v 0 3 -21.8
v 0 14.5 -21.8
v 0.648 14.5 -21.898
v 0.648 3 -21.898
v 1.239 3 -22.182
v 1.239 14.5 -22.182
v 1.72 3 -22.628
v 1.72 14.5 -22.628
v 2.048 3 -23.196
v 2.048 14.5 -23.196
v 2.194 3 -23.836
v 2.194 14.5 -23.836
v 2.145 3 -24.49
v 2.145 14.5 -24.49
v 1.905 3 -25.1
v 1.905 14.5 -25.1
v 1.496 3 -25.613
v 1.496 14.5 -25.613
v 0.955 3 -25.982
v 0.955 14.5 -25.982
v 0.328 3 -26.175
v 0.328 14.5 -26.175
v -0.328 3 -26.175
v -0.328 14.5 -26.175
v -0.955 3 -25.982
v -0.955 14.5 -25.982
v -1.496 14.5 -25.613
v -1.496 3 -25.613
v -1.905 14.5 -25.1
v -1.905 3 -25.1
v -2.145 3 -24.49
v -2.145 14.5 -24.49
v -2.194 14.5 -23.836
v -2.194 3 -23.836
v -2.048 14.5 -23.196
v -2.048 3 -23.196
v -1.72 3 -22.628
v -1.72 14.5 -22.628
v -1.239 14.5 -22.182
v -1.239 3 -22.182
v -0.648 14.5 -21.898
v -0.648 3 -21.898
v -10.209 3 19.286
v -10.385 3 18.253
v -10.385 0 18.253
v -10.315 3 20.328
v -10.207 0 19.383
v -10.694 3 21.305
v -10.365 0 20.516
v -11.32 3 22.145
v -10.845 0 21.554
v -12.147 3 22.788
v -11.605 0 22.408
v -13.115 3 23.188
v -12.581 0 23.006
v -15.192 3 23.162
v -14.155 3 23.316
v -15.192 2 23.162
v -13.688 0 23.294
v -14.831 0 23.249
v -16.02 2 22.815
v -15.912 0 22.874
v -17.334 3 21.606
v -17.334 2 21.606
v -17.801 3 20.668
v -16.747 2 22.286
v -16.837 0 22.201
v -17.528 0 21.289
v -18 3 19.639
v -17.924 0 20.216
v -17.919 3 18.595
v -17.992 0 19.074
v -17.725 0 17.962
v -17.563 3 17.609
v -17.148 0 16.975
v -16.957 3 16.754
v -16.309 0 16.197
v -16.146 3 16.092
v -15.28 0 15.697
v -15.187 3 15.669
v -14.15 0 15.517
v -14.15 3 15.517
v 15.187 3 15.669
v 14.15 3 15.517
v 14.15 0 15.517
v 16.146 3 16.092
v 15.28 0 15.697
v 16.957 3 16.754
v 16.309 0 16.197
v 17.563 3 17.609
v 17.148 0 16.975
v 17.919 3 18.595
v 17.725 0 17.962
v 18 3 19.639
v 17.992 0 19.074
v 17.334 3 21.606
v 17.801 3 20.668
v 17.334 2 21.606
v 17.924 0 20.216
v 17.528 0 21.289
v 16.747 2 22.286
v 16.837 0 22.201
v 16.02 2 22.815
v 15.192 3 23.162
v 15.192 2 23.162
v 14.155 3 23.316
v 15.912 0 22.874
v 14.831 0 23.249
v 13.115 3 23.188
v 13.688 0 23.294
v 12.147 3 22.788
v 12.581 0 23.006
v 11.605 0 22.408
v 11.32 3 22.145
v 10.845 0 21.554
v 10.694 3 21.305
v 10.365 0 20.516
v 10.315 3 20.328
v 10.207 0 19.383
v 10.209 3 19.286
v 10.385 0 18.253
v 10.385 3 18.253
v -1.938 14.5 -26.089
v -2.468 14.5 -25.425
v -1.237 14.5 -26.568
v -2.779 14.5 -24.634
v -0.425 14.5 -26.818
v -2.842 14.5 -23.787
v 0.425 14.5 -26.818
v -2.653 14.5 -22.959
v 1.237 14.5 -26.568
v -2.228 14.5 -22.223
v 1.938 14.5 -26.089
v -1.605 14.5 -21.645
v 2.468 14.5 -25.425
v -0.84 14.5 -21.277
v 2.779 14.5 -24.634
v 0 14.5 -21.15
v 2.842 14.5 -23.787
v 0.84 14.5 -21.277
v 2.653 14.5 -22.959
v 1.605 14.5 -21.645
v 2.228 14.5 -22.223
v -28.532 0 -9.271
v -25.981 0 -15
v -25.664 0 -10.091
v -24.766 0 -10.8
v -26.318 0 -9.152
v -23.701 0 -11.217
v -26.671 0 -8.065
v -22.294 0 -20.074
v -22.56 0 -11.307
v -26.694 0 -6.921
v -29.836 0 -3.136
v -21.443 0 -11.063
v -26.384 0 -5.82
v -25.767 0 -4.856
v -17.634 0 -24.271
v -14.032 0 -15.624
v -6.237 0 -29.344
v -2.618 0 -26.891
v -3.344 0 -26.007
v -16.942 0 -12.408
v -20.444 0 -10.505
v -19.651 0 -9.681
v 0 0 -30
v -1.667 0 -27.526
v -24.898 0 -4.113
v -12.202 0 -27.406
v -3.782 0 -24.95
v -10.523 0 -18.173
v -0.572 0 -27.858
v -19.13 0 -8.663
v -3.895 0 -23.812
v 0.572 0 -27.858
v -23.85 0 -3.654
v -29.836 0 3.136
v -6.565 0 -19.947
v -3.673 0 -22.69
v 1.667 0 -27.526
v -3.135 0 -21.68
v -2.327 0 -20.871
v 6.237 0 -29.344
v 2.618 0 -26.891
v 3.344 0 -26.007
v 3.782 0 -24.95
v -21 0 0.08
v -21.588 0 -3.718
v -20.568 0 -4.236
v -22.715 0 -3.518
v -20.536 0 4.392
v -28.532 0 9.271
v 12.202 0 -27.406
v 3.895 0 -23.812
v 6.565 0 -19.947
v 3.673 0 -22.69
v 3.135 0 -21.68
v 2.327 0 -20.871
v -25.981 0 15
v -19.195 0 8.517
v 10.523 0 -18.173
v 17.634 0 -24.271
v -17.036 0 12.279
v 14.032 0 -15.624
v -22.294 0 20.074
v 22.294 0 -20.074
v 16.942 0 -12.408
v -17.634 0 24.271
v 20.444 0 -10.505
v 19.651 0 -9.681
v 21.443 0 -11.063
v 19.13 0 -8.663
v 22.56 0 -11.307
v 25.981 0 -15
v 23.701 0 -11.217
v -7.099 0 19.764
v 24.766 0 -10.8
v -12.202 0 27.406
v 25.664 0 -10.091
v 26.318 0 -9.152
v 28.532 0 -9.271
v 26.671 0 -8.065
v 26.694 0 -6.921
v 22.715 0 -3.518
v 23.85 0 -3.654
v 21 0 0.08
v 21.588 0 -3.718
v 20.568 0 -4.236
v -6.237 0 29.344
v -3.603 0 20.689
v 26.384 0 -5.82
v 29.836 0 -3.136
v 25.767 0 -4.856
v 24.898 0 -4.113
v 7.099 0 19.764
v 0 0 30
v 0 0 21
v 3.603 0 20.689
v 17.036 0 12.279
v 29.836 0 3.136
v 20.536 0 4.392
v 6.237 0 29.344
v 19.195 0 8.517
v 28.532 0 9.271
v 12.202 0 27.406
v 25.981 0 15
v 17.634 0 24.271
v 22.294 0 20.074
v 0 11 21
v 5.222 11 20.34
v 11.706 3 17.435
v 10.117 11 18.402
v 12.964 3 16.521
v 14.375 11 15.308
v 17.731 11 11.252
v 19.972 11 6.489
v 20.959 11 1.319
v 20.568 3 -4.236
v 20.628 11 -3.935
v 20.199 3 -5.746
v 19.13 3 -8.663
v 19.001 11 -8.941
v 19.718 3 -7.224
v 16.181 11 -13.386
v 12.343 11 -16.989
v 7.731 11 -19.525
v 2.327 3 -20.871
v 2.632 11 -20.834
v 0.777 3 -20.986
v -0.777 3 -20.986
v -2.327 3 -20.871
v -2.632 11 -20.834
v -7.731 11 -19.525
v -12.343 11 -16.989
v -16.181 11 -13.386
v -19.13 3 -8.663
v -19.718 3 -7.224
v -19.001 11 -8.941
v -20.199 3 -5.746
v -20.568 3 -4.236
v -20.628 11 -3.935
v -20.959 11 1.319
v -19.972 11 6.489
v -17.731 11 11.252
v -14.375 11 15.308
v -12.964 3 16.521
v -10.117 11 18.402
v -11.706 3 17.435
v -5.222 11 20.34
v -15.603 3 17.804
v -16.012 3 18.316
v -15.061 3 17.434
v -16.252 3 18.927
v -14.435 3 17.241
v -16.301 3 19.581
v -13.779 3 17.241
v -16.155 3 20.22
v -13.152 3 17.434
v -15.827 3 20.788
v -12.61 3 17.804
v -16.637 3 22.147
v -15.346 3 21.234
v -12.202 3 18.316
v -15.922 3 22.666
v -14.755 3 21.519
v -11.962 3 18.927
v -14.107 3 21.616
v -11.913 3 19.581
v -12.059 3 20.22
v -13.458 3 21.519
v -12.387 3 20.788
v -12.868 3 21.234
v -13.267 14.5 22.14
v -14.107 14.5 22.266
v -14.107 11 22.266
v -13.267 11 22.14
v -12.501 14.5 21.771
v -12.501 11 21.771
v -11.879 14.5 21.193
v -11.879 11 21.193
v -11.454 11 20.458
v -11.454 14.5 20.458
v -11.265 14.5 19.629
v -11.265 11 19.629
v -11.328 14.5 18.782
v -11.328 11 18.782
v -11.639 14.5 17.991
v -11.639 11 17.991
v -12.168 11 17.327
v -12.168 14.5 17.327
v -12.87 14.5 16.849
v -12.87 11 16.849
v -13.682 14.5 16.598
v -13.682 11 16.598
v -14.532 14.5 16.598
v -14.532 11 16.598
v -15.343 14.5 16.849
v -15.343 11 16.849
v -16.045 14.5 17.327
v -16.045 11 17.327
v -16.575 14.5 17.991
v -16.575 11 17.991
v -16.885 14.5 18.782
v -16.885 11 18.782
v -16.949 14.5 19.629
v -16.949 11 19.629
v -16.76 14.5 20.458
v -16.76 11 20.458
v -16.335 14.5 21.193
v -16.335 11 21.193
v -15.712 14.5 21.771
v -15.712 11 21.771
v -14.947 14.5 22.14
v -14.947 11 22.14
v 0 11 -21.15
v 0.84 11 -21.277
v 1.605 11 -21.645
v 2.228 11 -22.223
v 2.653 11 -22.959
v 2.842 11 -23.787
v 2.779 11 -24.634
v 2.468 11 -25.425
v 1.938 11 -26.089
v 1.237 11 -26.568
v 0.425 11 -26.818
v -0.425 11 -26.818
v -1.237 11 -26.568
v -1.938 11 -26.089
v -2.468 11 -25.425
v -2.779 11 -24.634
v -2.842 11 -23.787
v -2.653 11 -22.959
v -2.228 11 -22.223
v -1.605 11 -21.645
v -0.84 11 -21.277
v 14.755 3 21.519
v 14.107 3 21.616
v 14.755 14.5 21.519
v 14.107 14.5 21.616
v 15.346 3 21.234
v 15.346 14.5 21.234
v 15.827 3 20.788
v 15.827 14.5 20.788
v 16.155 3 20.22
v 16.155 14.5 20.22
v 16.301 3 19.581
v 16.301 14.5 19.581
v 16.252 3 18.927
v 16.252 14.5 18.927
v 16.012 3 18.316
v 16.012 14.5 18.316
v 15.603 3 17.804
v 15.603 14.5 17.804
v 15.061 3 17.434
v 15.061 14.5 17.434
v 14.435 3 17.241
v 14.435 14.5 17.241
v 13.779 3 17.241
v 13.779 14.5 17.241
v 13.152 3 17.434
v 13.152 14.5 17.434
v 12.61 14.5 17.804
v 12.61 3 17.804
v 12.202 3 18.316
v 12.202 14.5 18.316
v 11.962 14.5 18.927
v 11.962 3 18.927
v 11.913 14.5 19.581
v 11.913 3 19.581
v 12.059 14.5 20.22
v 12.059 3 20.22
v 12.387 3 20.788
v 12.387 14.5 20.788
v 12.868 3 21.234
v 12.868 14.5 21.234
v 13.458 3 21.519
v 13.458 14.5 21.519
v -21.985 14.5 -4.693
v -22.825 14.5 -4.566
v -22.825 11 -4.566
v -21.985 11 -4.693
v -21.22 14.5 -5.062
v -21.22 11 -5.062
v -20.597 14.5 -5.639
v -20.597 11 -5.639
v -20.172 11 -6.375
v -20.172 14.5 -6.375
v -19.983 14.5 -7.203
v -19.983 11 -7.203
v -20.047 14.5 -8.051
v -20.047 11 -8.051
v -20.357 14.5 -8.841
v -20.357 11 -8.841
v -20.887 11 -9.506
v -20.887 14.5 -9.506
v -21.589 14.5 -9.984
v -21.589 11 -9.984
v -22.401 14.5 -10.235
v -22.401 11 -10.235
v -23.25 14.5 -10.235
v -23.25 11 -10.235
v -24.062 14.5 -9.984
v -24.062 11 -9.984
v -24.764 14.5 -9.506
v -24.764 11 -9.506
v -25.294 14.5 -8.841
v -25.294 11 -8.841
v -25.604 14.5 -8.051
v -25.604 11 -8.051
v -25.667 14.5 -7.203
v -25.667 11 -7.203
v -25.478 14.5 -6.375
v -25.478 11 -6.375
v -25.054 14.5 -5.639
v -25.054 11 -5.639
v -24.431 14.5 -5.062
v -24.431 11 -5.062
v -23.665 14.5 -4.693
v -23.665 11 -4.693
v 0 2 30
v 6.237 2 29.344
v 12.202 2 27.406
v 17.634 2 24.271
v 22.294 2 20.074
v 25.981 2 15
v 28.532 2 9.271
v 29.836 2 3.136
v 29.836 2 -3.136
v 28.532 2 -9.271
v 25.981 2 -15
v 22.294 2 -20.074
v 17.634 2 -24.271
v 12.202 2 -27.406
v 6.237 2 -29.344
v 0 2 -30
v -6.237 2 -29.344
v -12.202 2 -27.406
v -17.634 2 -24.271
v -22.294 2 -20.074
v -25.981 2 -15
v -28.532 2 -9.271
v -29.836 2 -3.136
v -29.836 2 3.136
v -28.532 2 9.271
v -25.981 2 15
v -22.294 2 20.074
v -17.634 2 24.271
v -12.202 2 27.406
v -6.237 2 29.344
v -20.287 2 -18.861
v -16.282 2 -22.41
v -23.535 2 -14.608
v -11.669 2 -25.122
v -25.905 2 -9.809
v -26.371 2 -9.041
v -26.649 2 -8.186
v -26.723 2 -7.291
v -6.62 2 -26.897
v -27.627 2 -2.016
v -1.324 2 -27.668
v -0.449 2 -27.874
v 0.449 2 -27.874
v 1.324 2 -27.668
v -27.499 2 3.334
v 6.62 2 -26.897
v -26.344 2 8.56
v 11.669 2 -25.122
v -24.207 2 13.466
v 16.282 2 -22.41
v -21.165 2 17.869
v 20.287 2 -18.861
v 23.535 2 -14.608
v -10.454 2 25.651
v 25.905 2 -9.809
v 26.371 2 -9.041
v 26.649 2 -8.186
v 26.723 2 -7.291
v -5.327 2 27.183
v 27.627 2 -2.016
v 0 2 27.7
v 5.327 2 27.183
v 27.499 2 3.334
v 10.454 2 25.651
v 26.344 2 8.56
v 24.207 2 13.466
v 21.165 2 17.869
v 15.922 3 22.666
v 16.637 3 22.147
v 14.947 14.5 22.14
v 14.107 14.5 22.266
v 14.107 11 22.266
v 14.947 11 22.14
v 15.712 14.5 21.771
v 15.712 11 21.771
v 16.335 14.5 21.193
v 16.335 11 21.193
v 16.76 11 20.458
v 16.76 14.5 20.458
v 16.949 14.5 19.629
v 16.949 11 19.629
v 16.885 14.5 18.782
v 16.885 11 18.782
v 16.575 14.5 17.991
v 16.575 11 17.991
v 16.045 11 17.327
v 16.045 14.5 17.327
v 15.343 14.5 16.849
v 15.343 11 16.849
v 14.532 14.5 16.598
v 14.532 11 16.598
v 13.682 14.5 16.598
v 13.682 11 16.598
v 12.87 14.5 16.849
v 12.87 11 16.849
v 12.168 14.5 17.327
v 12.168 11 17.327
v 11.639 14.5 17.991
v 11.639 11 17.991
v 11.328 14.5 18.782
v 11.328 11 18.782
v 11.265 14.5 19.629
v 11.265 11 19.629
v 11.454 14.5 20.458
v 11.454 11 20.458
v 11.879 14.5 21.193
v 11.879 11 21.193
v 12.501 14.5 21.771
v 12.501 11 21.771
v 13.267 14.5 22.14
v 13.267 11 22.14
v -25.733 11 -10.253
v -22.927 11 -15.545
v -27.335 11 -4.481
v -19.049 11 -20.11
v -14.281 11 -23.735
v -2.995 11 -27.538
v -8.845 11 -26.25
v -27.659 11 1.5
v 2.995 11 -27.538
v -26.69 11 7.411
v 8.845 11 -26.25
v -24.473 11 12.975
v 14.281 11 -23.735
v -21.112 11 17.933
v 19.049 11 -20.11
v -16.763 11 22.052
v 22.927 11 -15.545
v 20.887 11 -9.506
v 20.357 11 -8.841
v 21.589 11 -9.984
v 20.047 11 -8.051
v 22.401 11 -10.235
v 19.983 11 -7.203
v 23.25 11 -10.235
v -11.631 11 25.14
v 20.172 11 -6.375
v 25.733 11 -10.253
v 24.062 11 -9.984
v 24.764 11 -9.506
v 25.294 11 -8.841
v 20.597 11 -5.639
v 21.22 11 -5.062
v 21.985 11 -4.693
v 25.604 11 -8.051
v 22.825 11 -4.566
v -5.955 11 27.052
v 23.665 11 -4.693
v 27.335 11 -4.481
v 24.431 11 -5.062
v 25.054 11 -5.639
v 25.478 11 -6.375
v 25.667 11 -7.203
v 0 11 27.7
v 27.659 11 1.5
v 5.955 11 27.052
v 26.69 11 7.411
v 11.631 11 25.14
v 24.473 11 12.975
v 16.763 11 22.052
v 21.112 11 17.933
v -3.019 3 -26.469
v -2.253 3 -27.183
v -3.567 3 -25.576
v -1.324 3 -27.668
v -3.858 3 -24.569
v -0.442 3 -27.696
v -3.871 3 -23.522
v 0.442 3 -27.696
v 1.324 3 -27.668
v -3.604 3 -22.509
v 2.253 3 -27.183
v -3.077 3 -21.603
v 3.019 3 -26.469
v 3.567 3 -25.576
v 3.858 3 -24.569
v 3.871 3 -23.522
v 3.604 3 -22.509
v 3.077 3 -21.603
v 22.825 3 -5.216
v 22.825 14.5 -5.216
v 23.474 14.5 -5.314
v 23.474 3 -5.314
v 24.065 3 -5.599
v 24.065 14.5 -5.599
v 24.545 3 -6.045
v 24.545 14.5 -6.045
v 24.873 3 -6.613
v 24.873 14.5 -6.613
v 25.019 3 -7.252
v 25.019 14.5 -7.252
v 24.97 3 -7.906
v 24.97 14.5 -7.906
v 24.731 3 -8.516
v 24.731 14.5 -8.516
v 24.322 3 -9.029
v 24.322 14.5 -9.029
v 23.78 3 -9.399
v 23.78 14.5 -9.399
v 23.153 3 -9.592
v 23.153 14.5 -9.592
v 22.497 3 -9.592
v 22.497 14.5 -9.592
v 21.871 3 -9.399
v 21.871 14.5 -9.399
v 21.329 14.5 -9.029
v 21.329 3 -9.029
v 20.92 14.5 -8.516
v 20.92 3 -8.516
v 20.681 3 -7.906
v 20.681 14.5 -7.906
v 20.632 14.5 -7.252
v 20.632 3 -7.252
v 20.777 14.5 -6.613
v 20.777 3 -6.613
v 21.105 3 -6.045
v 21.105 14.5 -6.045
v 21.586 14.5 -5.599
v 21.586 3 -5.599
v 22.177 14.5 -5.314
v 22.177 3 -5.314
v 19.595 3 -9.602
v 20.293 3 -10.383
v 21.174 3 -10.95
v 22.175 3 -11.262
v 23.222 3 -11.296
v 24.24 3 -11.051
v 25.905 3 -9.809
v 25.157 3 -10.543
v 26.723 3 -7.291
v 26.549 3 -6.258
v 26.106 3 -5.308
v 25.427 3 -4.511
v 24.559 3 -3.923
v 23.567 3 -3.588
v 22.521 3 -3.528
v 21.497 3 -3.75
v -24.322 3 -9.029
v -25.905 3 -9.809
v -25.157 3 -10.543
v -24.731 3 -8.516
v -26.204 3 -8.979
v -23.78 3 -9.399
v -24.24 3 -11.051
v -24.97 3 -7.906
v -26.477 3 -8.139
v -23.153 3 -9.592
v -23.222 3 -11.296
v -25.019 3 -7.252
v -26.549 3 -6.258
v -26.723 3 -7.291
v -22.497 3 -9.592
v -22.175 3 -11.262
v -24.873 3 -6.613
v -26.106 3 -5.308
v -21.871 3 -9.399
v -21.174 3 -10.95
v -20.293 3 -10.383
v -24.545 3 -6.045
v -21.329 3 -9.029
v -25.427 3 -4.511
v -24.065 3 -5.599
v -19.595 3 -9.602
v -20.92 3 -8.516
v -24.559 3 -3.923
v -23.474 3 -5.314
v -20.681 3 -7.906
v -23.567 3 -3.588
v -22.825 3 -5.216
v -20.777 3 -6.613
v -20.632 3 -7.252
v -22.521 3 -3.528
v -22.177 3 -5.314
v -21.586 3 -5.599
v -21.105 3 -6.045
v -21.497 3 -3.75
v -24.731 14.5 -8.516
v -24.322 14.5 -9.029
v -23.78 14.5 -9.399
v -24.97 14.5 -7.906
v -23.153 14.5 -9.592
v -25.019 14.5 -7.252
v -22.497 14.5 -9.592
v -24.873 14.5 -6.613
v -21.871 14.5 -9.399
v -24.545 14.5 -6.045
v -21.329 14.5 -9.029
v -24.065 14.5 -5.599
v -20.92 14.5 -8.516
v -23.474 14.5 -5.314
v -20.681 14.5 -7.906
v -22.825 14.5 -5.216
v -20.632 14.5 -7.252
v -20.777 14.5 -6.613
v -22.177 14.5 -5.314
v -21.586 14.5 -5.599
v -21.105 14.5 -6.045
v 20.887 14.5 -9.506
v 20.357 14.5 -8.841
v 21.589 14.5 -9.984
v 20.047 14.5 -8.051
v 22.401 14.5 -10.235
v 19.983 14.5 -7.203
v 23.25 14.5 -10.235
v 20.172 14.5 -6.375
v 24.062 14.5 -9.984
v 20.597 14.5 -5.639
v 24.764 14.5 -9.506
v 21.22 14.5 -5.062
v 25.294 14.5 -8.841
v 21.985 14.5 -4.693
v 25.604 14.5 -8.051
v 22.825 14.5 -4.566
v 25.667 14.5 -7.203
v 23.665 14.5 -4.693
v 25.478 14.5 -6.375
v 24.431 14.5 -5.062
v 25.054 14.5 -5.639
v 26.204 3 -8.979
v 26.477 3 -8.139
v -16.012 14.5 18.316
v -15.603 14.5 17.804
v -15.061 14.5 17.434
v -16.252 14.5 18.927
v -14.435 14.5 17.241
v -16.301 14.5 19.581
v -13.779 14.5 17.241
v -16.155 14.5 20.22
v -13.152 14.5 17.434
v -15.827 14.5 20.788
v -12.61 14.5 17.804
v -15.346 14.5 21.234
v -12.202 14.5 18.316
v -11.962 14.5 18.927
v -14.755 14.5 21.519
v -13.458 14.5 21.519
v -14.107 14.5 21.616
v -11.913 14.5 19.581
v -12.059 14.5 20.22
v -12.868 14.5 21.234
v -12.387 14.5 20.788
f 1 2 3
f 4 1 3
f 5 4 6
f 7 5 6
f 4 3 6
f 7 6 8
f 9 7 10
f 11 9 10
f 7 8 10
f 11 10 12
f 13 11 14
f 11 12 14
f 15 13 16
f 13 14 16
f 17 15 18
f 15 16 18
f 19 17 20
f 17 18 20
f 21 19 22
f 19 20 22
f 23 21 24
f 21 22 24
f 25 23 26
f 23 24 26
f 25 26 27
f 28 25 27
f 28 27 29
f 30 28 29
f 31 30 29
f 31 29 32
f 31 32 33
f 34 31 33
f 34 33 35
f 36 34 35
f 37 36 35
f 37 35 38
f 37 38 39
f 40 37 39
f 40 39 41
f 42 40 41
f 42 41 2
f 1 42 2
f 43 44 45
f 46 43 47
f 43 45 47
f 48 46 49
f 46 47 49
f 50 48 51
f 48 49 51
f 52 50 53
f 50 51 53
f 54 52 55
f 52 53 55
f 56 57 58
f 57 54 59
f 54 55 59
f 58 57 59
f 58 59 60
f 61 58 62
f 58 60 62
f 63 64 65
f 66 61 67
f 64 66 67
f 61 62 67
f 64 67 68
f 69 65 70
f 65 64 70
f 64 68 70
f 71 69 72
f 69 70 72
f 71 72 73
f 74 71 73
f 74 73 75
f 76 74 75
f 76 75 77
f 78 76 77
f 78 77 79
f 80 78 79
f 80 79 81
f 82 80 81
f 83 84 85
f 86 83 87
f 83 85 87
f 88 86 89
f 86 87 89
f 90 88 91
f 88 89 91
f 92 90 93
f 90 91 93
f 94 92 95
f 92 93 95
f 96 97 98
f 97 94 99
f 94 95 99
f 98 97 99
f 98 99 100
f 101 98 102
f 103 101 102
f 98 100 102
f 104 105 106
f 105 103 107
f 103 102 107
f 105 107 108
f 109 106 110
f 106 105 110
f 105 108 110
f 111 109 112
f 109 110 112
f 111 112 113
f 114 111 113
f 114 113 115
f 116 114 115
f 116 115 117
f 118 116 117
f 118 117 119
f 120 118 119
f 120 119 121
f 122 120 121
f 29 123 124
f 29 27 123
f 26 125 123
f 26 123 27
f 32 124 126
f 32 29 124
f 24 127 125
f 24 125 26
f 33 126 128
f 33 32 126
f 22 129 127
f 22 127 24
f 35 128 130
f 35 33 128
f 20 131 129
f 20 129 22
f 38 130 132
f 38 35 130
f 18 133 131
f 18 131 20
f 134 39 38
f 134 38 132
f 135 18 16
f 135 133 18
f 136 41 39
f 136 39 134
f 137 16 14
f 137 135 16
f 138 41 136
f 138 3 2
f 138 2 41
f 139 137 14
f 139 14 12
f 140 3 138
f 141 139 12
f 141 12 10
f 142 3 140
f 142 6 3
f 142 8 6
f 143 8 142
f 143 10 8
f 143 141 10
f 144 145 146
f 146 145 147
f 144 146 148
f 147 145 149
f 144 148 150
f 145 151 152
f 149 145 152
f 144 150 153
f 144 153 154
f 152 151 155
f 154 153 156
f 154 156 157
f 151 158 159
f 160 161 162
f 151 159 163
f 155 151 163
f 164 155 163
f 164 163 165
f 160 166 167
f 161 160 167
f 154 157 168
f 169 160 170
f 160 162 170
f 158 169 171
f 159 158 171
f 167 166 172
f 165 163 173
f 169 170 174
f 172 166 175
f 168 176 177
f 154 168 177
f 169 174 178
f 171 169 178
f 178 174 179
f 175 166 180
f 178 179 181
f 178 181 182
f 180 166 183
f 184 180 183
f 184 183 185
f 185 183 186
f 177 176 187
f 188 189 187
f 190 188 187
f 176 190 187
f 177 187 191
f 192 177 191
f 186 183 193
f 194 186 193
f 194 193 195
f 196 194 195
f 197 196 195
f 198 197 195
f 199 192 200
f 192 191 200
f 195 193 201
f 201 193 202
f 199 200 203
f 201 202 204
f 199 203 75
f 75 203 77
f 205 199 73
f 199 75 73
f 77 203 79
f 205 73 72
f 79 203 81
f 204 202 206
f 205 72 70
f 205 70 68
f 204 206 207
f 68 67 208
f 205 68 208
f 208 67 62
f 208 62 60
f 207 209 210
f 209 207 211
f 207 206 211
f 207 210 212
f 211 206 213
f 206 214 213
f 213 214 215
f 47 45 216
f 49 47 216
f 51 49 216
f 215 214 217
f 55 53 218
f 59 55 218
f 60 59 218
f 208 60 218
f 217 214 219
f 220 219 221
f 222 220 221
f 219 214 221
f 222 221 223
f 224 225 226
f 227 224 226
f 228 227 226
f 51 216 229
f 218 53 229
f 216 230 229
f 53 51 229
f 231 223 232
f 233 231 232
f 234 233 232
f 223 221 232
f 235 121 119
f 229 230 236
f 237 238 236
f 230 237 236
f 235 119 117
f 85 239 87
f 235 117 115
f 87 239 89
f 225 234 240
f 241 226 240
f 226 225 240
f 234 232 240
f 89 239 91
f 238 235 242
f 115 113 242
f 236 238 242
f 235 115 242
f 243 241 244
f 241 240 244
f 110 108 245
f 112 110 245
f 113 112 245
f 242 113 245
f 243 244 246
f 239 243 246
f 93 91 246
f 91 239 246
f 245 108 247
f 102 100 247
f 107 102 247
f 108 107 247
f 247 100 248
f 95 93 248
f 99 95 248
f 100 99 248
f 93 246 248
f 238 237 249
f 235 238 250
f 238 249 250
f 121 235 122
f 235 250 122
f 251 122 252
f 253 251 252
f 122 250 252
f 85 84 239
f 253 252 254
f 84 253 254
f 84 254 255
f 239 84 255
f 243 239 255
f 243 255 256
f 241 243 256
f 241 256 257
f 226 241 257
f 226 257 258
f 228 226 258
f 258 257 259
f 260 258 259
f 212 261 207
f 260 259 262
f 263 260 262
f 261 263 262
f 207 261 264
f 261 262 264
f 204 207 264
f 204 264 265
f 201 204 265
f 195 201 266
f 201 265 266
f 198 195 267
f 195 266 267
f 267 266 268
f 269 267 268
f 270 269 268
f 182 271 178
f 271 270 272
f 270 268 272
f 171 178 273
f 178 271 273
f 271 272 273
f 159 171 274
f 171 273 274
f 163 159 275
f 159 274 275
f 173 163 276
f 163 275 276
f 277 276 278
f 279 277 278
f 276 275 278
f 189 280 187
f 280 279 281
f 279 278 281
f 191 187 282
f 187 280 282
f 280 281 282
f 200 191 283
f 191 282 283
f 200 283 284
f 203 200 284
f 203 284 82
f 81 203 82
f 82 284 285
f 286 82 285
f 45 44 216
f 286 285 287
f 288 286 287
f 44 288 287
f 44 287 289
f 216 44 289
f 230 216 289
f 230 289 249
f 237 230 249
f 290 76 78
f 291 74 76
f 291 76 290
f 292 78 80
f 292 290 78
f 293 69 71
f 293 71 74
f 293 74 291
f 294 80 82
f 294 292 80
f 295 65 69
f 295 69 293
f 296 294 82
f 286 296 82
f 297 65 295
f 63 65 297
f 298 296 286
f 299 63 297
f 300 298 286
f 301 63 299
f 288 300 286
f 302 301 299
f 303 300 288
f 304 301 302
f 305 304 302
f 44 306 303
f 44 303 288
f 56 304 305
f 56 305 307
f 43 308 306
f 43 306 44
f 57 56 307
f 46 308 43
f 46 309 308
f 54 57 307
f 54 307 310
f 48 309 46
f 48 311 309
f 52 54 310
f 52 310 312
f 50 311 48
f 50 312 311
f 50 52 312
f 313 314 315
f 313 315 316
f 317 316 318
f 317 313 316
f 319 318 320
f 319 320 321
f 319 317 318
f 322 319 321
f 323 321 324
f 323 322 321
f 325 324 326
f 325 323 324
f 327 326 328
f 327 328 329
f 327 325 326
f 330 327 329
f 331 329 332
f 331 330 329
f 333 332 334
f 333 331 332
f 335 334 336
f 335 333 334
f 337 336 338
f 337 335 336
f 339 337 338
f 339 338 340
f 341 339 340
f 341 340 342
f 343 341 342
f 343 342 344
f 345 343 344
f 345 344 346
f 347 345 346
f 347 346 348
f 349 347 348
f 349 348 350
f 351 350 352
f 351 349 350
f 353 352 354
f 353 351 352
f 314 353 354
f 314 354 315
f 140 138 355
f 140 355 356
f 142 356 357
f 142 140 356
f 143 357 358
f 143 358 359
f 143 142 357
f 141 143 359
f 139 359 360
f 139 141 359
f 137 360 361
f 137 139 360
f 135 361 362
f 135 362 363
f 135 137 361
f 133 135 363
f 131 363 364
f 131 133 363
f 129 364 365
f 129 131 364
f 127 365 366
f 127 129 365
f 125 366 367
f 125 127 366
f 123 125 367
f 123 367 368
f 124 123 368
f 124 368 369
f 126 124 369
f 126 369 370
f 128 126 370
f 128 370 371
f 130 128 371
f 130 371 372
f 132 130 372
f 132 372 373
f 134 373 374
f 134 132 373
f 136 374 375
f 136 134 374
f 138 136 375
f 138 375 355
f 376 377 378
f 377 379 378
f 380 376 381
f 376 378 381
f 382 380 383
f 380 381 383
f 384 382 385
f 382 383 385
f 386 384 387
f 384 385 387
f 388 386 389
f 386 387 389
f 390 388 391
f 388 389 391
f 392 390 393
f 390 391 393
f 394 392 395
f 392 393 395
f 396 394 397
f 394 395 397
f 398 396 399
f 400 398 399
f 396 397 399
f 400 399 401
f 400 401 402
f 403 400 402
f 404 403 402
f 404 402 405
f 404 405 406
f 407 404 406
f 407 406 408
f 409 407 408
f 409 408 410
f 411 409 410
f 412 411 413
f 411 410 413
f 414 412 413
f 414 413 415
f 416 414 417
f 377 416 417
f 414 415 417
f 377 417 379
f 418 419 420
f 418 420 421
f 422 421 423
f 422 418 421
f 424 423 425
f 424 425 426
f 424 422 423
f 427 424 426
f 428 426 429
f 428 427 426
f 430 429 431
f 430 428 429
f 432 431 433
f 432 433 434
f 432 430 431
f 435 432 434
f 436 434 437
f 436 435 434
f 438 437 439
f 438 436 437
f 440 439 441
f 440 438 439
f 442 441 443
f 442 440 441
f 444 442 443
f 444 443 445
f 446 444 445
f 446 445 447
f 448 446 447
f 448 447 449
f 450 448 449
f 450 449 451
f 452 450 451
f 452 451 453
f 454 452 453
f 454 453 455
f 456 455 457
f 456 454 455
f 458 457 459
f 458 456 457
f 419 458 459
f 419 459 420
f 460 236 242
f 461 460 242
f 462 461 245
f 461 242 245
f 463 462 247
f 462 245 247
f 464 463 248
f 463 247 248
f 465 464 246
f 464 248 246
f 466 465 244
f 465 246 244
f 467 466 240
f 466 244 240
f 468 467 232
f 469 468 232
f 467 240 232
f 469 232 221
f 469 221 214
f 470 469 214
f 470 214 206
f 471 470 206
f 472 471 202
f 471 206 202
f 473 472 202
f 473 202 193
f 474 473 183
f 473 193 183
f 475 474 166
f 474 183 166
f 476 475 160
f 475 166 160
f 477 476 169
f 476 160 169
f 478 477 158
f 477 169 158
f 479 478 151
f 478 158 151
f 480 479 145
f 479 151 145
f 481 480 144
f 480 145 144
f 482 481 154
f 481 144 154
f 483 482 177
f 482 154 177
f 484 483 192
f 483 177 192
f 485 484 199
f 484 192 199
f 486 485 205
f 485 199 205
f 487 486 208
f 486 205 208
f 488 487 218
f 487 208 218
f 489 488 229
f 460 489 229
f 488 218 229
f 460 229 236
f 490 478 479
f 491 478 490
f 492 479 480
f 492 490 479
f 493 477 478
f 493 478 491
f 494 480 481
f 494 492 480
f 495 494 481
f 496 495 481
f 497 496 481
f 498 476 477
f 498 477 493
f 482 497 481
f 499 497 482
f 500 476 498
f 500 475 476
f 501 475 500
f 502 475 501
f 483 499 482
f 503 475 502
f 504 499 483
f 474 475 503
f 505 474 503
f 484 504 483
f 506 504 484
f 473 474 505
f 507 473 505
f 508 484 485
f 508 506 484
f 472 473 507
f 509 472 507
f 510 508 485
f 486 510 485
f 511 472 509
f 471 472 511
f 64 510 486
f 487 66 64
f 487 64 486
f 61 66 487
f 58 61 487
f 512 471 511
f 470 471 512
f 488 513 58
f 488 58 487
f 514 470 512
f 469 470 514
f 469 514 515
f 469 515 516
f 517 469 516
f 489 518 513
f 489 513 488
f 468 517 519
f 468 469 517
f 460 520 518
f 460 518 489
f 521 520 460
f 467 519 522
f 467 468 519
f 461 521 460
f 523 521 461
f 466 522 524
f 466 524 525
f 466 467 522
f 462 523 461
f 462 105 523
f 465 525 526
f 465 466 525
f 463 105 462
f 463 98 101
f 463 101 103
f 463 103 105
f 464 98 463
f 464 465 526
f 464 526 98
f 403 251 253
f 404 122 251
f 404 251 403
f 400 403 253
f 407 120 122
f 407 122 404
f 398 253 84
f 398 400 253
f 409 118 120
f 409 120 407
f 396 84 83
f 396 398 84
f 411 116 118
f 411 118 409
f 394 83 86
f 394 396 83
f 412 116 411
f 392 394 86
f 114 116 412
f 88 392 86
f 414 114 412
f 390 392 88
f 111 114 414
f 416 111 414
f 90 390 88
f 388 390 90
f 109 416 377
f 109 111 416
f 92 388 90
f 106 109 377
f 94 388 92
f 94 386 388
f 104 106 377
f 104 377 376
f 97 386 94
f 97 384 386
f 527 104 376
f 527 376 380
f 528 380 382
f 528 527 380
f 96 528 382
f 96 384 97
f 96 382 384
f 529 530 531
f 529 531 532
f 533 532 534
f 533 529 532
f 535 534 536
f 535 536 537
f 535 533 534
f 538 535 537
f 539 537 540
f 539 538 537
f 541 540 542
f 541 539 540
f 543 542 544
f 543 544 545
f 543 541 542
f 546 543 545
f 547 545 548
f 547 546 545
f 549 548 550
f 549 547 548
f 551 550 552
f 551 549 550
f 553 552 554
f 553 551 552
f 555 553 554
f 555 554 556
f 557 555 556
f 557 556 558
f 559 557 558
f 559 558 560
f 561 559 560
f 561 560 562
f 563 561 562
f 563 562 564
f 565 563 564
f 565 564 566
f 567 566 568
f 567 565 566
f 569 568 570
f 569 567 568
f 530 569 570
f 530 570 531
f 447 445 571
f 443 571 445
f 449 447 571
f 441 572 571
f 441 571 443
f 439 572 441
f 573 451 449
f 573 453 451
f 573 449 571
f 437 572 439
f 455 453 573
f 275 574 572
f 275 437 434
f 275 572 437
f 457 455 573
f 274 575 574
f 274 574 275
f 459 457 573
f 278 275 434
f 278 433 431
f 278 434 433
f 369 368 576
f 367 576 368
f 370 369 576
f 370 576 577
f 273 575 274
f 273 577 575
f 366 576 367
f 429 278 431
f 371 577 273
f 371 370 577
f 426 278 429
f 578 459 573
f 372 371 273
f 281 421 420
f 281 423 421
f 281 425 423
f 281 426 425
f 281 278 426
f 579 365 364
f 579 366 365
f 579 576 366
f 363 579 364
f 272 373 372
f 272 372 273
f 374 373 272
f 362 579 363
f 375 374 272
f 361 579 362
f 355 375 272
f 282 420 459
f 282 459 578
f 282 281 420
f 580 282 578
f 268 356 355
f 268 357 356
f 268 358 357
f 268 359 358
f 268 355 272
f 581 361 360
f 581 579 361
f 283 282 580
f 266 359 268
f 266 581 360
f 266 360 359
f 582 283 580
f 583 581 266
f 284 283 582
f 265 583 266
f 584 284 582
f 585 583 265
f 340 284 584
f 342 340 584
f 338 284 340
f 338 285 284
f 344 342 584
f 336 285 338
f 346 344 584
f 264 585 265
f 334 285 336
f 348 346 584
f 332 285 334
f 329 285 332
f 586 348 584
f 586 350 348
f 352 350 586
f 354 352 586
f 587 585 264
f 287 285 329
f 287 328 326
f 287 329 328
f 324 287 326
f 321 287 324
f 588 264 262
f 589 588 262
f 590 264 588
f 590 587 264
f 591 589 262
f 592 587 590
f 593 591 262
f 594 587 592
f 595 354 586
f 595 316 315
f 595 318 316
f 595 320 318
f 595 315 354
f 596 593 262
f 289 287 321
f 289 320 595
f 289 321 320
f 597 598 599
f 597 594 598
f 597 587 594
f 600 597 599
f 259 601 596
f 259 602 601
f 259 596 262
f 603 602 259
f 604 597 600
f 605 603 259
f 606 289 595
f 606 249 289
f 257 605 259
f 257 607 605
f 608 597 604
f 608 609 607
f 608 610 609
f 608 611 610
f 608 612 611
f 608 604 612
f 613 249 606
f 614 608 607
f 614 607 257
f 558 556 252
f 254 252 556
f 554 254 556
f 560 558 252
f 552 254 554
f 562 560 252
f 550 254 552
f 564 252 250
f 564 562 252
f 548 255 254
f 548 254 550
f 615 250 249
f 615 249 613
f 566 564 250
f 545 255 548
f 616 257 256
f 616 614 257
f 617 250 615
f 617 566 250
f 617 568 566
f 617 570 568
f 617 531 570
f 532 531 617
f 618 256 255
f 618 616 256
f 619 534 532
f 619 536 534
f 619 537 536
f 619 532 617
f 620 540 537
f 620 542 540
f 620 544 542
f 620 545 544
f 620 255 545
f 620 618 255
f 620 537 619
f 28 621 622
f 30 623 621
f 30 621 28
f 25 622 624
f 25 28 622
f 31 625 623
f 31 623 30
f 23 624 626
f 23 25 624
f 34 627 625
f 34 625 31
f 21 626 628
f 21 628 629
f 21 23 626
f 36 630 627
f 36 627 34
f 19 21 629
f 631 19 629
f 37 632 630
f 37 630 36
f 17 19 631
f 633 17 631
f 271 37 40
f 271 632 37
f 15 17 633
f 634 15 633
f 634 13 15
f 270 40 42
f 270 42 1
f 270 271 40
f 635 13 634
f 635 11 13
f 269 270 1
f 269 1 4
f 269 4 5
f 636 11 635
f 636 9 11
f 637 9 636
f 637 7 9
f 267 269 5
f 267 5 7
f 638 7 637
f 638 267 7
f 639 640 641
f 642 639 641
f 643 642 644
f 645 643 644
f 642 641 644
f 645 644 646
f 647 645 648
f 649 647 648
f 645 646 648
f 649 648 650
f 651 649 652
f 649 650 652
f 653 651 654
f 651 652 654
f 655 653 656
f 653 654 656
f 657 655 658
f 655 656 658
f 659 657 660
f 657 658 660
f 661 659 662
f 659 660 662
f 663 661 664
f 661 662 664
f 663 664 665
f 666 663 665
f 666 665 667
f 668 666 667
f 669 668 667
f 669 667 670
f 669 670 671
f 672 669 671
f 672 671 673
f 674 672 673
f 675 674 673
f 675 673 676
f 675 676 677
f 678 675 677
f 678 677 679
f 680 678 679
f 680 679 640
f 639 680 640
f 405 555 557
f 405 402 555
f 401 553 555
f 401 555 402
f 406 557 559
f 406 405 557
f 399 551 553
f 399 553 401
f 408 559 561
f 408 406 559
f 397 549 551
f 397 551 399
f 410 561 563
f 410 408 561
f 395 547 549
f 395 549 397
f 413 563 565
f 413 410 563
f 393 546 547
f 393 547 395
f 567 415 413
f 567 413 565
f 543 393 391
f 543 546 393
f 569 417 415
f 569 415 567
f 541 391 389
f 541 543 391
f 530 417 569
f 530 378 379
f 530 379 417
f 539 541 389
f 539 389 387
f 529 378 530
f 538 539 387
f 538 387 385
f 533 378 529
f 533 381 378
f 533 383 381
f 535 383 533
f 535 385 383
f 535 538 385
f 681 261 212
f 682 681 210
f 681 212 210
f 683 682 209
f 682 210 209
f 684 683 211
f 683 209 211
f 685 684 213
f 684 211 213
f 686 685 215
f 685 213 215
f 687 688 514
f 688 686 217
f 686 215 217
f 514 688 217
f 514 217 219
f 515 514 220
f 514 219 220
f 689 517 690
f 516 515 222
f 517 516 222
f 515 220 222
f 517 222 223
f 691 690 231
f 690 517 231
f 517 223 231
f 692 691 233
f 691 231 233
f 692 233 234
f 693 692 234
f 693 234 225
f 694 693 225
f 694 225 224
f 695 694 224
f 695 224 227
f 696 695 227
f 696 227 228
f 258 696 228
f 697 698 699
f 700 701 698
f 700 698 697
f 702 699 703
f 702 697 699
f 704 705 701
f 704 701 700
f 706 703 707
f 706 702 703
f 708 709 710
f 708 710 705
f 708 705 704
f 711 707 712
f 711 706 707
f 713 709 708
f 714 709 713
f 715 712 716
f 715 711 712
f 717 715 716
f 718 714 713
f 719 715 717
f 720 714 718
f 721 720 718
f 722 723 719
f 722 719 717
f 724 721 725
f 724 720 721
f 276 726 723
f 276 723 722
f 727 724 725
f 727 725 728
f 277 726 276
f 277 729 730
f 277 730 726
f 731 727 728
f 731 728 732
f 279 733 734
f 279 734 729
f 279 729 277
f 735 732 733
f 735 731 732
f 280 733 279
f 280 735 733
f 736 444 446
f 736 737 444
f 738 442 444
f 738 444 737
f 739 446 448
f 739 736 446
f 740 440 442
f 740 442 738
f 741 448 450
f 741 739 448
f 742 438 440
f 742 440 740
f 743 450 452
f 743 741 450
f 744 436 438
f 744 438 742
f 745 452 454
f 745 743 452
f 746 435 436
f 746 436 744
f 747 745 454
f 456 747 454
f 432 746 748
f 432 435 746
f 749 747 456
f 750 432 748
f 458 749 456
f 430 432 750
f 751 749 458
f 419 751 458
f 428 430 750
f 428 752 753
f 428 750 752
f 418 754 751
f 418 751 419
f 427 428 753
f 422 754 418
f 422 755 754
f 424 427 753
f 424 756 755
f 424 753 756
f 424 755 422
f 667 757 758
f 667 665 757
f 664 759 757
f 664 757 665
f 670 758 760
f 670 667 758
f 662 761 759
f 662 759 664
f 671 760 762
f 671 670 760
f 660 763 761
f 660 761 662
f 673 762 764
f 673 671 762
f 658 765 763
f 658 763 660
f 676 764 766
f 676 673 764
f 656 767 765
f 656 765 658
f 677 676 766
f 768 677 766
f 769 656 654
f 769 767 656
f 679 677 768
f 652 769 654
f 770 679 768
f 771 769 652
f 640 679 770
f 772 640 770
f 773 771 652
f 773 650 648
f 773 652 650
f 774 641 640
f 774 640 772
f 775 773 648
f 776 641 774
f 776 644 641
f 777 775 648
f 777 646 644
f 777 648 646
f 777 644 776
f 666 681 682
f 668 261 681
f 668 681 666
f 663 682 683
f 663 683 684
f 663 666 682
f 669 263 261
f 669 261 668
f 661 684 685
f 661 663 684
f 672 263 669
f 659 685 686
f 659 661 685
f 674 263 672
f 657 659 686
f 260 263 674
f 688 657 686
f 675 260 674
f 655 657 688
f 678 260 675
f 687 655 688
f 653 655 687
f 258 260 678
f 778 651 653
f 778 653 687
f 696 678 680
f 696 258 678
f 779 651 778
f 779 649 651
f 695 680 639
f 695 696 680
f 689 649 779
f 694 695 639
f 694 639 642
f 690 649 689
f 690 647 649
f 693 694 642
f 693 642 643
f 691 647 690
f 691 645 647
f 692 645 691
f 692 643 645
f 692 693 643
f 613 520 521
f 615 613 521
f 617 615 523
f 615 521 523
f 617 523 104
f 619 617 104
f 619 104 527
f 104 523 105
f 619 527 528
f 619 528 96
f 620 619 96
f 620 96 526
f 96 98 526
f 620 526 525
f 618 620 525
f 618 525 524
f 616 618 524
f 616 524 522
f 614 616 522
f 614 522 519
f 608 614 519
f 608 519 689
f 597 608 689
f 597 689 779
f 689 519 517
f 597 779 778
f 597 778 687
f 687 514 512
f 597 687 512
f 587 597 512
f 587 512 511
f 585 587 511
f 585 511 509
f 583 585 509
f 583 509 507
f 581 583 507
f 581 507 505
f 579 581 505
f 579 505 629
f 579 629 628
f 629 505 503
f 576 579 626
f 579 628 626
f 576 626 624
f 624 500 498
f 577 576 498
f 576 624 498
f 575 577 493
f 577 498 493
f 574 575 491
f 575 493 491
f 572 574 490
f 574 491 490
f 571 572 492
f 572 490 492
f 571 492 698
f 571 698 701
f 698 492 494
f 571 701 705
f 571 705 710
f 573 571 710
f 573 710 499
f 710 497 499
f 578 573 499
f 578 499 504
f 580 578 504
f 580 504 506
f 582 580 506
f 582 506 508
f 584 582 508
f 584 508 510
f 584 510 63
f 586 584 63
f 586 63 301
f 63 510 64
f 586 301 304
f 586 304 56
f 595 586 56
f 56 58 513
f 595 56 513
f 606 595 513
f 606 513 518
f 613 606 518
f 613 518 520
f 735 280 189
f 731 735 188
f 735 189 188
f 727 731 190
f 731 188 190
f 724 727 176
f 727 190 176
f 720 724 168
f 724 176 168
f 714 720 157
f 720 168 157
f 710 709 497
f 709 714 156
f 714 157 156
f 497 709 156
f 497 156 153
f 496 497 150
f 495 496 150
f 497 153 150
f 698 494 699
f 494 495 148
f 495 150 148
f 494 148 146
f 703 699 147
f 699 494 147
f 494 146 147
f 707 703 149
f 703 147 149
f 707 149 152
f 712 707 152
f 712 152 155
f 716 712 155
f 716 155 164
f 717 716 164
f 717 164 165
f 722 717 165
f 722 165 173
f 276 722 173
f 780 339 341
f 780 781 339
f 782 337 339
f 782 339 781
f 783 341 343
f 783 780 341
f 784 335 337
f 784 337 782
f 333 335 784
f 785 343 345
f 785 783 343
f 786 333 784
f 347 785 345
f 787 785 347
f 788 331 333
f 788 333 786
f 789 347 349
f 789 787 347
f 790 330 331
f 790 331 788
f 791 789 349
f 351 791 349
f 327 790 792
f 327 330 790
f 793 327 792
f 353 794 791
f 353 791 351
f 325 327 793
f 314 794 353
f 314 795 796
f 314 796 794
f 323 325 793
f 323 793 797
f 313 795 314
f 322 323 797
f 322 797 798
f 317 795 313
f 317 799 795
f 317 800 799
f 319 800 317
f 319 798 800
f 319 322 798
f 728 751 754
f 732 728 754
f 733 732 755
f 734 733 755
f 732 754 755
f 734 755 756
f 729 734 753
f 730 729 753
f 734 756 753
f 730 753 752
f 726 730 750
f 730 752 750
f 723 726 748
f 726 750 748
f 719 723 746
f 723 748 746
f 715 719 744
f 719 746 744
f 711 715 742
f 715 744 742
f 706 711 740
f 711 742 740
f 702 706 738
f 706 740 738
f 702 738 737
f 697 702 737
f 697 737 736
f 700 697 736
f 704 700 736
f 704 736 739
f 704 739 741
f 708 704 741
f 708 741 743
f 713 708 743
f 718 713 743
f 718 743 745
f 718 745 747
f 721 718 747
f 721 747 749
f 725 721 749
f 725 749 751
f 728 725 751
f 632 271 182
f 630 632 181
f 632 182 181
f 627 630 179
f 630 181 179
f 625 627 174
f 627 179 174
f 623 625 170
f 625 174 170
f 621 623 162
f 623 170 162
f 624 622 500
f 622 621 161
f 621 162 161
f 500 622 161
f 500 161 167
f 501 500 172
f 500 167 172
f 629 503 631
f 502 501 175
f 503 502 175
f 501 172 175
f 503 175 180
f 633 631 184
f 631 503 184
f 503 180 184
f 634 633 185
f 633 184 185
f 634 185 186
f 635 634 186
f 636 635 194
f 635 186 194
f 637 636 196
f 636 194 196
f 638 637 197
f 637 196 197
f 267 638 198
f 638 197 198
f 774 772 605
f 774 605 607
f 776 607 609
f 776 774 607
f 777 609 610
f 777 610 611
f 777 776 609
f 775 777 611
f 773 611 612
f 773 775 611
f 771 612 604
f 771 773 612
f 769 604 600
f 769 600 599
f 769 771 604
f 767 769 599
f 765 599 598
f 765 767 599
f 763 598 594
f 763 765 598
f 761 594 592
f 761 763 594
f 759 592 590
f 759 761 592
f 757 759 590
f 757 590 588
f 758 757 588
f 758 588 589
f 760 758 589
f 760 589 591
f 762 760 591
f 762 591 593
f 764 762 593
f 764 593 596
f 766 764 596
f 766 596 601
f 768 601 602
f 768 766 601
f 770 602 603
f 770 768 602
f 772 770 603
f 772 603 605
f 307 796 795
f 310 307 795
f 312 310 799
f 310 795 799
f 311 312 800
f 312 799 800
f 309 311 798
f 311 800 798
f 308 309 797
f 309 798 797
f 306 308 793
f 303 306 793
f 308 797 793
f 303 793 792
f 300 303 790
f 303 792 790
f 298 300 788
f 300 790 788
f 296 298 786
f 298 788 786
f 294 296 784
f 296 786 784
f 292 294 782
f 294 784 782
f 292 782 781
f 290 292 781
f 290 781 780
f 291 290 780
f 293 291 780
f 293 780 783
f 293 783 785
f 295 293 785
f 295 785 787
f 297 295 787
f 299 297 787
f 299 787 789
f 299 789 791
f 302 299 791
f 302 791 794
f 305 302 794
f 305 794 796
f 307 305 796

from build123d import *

# Parameters (mm, degrees)
SKETCH3_R           = 27.7
BOSS_EXTRUDE2_DEPTH = 11
SKETCH4_R           = 30
BOSS_EXTRUDE3_DEPTH = 2
SKETCH5_R           = 2.2
CUT_EXTRUDE1_DEPTH  = 44.829214002
SKETCH9_R           = 21
CUT_EXTRUDE5_DEPTH  = 44.829214002
BOSS_EXTRUDE4_START = 3.5
SKETCH10_R          = 2.85
SKETCH10_R_2        = 2.2
BOSS_EXTRUDE4_DEPTH = 3.5
SKETCH15_R          = 3.9
CUT_EXTRUDE6_DEPTH  = 3


with BuildPart() as part:
    # Sketch3 → Boss-Extrude2 (new body)
    with BuildSketch(Plane(origin=(0, 0, 0), x_dir=(1, 0, 0), z_dir=(0, 1, 0))):
        with Locations(Location((0, 0, 0), (0, 0, 270))):
            Circle(SKETCH3_R)
    extrude(amount=BOSS_EXTRUDE2_DEPTH)

    # Sketch4 → Boss-Extrude3 (add)
    with BuildSketch(Plane(origin=(0, 0, 0), x_dir=(1, 0, 0), z_dir=(0, 1, 0))):
        with Locations(Location((0, 0, 0), (0, 0, 270))):
            Circle(SKETCH4_R)
    extrude(amount=BOSS_EXTRUDE3_DEPTH)

    # Sketch5 → Cut-Extrude1 (cut, through all)
    with BuildSketch(Plane(origin=(0, 11, 0), x_dir=(1, 0, 0), z_dir=(0, 1, 0))):
        with Locations(Location((0, 24, 0), (0, 0, 270))):
            Circle(SKETCH5_R)
        with Locations(Location((22.825356391, 7.416407865, 0), (0, 0, 270))):
            Circle(SKETCH5_R)
        with Locations(Location((14.106846055, -19.416407865, 0), (0, 0, 270))):
            Circle(SKETCH5_R)
        with Locations(Location((-14.106846055, -19.416407865, 0), (0, 0, 270))):
            Circle(SKETCH5_R)
        with Locations(Location((-22.825356391, 7.416407865, 0), (0, 0, 270))):
            Circle(SKETCH5_R)
    extrude(amount=-CUT_EXTRUDE1_DEPTH, mode=Mode.SUBTRACT)

    # Sketch9 → Cut-Extrude5 (cut, through all)
    with BuildSketch(Plane(origin=(0, 11, 0), x_dir=(1, 0, 0), z_dir=(0, 1, 0))):
        with Locations(Location((0, 0, 0), (0, 0, 270))):
            Circle(SKETCH9_R)
    extrude(amount=-CUT_EXTRUDE5_DEPTH, mode=Mode.SUBTRACT)

    # Sketch10 → Boss-Extrude4 (add)
    # profile 1 of 5: a face of its own
    with BuildSketch(Plane(origin=(0, 11, 0), x_dir=(1, 0, 0), z_dir=(0, 1, 0)).offset(BOSS_EXTRUDE4_START)):
        with Locations(Location((-22.825356391, 7.416407865, 0), (0, 0, 270))):
            Circle(SKETCH10_R)
        with Locations(Location((-22.825356391, 7.416407865, 0), (0, 0, 270))):
            Circle(SKETCH10_R_2, mode=Mode.SUBTRACT)
    # profile 2 of 5: a face of its own
    with BuildSketch(Plane(origin=(0, 11, 0), x_dir=(1, 0, 0), z_dir=(0, 1, 0)).offset(BOSS_EXTRUDE4_START)):
        with Locations(Location((0, 24, 0), (0, 0, 270))):
            Circle(SKETCH10_R)
        with Locations(Location((0, 24, 0), (0, 0, 270))):
            Circle(SKETCH10_R_2, mode=Mode.SUBTRACT)
    # profile 3 of 5: a face of its own
    with BuildSketch(Plane(origin=(0, 11, 0), x_dir=(1, 0, 0), z_dir=(0, 1, 0)).offset(BOSS_EXTRUDE4_START)):
        with Locations(Location((22.825356391, 7.416407865, 0), (0, 0, 270))):
            Circle(SKETCH10_R)
        with Locations(Location((22.825356391, 7.416407865, 0), (0, 0, 270))):
            Circle(SKETCH10_R_2, mode=Mode.SUBTRACT)
    # profile 4 of 5: a face of its own
    with BuildSketch(Plane(origin=(0, 11, 0), x_dir=(1, 0, 0), z_dir=(0, 1, 0)).offset(BOSS_EXTRUDE4_START)):
        with Locations(Location((14.106846055, -19.416407865, 0), (0, 0, 270))):
            Circle(SKETCH10_R)
        with Locations(Location((14.106846055, -19.416407865, 0), (0, 0, 270))):
            Circle(SKETCH10_R_2, mode=Mode.SUBTRACT)
    # profile 5 of 5: a face of its own
    with BuildSketch(Plane(origin=(0, 11, 0), x_dir=(1, 0, 0), z_dir=(0, 1, 0)).offset(BOSS_EXTRUDE4_START)):
        with Locations(Location((-14.106846055, -19.416407865, 0), (0, 0, 270))):
            Circle(SKETCH10_R)
        with Locations(Location((-14.106846055, -19.416407865, 0), (0, 0, 270))):
            Circle(SKETCH10_R_2, mode=Mode.SUBTRACT)
    extrude(amount=-BOSS_EXTRUDE4_DEPTH)

    # Sketch15 → Cut-Extrude6 (cut)
    with BuildSketch(Plane.XZ):
        with Locations((-14.106846055, 19.416407865)):
            Circle(SKETCH15_R)
        with Locations((14.106846055, 19.416407865)):
            Circle(SKETCH15_R)
        with Locations((22.825356391, -7.416407865)):
            Circle(SKETCH15_R)
        with Locations((0, -24)):
            Circle(SKETCH15_R)
        with Locations((-22.825356391, -7.416407865)):
            Circle(SKETCH15_R)
    extrude(amount=-CUT_EXTRUDE6_DEPTH, mode=Mode.SUBTRACT)


solid = part.part
